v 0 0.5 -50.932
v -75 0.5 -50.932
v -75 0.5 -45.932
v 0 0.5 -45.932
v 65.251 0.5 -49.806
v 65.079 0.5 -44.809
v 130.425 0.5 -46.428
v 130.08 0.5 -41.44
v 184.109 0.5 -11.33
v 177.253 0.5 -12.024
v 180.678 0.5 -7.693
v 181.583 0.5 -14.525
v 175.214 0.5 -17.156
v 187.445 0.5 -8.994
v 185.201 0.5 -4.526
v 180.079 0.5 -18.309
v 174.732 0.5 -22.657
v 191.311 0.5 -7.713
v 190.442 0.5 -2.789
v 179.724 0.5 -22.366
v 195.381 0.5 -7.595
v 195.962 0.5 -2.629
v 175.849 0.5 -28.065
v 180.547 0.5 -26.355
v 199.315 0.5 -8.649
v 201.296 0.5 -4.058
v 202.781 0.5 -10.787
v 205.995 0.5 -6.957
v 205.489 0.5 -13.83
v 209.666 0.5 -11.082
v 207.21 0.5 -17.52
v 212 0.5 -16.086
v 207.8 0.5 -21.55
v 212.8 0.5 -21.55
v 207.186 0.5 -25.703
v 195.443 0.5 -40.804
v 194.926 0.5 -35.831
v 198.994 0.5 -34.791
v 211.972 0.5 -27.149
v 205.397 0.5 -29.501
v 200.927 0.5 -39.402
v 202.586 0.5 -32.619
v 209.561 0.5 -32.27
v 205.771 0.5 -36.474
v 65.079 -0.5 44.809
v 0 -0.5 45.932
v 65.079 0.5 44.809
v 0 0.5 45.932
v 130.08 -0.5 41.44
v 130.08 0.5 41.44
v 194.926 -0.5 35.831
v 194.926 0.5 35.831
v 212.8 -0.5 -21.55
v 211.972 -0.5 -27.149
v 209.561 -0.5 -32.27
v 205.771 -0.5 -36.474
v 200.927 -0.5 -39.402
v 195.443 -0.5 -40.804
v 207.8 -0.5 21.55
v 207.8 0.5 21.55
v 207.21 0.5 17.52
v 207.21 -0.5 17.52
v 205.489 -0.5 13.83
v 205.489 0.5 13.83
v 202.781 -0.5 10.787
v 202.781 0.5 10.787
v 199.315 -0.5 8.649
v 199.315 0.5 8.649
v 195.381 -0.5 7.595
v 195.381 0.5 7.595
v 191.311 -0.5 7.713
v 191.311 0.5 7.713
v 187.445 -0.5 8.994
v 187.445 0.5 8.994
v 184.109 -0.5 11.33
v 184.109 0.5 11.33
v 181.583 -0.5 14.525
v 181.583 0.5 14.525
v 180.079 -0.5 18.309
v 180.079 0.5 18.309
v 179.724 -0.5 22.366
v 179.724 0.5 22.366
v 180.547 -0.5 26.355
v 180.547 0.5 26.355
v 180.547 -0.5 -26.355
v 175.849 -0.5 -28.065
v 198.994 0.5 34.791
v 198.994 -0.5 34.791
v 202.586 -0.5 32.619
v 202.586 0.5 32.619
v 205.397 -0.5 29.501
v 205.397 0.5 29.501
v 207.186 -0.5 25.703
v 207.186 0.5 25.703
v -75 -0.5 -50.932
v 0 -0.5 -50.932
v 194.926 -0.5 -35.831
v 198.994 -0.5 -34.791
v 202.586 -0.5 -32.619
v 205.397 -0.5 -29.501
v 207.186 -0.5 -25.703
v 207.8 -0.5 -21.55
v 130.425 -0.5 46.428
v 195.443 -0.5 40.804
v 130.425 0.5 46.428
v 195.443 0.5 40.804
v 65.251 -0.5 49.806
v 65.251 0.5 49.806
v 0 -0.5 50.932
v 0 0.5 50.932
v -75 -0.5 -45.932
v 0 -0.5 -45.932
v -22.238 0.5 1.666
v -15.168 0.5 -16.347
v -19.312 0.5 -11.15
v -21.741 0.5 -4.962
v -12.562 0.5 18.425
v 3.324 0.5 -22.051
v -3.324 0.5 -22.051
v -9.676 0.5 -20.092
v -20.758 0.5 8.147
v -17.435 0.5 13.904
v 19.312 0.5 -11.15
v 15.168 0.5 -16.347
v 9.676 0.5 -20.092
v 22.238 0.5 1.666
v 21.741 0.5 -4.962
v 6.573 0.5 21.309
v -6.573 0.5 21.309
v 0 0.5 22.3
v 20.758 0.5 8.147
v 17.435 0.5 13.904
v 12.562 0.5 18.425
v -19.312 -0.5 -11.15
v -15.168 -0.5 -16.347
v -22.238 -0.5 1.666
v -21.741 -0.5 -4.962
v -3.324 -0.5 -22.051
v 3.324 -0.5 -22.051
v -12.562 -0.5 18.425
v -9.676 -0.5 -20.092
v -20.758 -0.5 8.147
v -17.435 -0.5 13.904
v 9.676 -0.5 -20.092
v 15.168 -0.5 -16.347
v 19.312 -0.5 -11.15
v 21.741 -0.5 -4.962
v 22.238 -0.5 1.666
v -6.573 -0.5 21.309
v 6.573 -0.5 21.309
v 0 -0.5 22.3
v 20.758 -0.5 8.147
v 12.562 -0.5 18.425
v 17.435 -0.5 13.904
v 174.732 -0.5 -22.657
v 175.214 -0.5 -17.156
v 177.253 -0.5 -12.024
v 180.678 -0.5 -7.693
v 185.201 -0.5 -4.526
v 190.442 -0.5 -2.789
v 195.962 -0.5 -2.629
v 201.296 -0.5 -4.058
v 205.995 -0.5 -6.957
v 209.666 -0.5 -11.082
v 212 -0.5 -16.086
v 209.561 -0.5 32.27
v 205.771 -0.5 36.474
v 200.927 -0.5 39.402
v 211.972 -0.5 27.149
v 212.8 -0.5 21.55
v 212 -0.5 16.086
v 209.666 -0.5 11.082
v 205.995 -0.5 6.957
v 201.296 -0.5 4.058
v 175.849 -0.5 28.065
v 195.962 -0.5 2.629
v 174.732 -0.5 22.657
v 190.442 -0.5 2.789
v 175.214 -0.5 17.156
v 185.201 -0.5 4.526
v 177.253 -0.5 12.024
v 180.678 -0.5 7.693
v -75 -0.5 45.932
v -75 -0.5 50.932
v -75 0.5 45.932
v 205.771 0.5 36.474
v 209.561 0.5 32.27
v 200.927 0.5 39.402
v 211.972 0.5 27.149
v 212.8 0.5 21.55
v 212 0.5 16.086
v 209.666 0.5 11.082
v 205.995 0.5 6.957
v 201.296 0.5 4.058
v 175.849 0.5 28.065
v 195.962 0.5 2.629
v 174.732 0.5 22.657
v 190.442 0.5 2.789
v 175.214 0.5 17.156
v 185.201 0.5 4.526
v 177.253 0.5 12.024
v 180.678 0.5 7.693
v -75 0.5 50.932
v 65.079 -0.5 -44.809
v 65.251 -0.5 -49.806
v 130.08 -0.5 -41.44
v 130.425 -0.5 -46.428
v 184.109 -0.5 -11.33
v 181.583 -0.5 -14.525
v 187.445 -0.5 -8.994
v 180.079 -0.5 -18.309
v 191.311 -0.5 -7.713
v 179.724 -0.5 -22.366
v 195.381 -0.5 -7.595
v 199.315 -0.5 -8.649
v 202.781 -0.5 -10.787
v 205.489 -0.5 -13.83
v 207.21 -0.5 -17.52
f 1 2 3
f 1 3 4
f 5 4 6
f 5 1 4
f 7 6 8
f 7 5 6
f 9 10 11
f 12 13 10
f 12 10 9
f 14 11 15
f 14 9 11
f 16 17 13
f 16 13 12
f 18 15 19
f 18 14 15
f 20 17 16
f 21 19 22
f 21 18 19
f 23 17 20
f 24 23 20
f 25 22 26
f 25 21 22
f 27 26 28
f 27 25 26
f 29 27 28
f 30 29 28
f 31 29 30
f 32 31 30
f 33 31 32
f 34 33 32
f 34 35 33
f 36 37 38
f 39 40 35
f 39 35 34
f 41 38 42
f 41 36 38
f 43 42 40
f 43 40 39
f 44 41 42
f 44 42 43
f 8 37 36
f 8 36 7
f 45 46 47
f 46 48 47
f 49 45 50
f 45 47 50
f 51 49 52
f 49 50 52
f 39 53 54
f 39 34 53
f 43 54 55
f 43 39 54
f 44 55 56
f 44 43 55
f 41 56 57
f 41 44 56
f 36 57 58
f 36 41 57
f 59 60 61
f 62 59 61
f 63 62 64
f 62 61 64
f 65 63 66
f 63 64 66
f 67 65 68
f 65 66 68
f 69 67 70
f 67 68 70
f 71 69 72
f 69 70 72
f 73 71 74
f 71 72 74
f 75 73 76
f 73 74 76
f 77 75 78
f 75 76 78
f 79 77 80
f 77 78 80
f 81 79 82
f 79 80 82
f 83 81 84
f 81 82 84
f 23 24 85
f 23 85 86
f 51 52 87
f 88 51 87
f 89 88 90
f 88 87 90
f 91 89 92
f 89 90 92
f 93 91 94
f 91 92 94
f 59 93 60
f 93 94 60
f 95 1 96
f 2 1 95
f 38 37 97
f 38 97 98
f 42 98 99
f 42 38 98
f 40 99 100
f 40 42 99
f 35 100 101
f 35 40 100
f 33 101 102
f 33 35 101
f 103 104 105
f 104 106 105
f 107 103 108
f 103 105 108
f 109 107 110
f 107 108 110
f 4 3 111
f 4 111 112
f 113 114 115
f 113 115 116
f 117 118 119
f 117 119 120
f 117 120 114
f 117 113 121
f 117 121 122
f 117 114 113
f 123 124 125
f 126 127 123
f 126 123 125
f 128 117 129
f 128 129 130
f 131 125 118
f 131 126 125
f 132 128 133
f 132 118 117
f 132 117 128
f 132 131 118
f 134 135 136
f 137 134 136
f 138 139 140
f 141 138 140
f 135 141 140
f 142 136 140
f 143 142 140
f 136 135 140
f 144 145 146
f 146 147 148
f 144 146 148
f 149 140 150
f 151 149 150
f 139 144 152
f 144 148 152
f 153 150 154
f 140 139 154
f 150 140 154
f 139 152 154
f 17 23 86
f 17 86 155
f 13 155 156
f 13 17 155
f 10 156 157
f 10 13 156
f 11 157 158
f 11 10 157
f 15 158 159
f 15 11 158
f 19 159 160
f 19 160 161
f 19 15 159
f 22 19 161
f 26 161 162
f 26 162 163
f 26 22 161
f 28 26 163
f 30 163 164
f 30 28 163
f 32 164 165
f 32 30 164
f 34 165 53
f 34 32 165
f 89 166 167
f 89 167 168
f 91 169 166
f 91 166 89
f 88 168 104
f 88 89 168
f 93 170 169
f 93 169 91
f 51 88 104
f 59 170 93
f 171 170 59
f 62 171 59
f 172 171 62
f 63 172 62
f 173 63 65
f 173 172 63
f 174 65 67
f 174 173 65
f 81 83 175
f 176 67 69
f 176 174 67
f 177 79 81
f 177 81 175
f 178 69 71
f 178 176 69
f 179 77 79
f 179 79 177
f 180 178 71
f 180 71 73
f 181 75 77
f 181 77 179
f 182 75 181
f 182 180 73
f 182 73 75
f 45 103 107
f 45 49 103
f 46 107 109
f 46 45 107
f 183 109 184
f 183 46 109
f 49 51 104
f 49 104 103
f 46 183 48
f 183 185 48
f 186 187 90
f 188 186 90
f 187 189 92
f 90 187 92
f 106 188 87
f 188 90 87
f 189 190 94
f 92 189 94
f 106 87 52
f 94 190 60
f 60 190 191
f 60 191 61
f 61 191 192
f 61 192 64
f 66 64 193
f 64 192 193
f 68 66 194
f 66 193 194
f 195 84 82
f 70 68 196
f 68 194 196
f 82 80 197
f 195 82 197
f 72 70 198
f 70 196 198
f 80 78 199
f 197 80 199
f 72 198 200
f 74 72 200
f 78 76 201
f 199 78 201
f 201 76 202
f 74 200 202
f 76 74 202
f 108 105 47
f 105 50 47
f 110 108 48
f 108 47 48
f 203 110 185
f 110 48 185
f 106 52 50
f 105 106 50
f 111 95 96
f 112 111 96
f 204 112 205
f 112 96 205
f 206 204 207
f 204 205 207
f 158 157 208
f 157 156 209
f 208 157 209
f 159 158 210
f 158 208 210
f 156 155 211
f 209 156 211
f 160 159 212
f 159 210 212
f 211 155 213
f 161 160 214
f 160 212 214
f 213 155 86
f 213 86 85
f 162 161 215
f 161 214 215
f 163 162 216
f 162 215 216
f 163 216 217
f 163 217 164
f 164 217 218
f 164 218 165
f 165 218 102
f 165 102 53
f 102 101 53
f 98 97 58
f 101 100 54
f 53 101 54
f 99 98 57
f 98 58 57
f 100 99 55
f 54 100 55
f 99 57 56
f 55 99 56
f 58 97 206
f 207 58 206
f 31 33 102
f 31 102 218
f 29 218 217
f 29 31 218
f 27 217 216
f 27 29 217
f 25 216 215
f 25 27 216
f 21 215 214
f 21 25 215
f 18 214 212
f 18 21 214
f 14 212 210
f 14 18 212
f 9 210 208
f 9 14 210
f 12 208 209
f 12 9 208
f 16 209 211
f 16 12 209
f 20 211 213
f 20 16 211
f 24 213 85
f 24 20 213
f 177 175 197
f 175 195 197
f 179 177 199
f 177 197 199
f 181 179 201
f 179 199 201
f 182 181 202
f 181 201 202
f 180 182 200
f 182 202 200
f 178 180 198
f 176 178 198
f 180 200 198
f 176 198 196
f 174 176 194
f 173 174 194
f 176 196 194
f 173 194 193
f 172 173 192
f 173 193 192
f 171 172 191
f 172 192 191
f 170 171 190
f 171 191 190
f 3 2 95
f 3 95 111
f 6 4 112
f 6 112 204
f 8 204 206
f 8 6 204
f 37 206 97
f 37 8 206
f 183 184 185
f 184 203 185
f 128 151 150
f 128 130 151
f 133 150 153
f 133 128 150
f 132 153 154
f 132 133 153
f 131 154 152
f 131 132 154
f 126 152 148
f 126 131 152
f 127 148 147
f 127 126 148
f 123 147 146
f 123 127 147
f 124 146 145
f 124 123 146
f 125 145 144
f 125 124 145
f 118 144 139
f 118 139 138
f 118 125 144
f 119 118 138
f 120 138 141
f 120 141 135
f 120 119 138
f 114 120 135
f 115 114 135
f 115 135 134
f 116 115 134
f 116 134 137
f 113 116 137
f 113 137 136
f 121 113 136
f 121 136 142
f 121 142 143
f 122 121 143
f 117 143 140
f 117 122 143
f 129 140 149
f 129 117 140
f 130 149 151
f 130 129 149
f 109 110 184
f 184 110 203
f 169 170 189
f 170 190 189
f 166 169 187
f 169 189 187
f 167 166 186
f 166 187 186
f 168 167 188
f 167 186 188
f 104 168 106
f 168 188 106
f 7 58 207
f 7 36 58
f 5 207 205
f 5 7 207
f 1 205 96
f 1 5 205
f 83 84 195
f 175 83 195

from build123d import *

# Parameters (mm, degrees)
SKETCH1_R             = 22.3
BOSS_EXTRUDE1_DEPTH   = 0.5
BOSS_EXTRUDE1_2_DEPTH = 0.5
BOSS_EXTRUDE1_3_DEPTH = 0.5


with BuildPart() as part:
    # Sketch1 → Boss-Extrude1 (new, symmetric)
    with BuildSketch(Plane(origin=(0, 0, 0), x_dir=(1, 0, 0), z_dir=(0, 1, 0))):
        with Locations(Location((0, 0, 0), (0, 0, 270))):
            Circle(SKETCH1_R)
    extrude(amount=BOSS_EXTRUDE1_DEPTH, both=True)


with BuildPart() as body_2:
    # Sketch1 → Boss-Extrude1 2 (new, symmetric)
    with BuildSketch(Plane(origin=(0, 0, 0), x_dir=(1, 0, 0), z_dir=(0, 1, 0))):
        with BuildLine():
            Line((0, 50.931890821), (-75, 50.931890821))
            Line((-75, 50.931890821), (-75, 45.931890821))
            Line((-75, 45.931890821), (0, 45.931890821))
            ThreePointArc((0, 45.931890821), (97.59386772, 43.404960787), (194.92619862, 35.830942477))
            ThreePointArc((194.92619862, 35.830942477), (204.106473558, 31.16353317), (207.8, 21.55))
            ThreePointArc((207.8, 21.55), (191.310601503, 7.71338788), (180.547069755, 26.354699048))
            Line((180.547069755, 26.354699048), (175.848518066, 28.06455636))
            ThreePointArc((175.848518066, 28.06455636), (190.442488159, 2.789326627), (212.8, 21.55))
            ThreePointArc((212.8, 21.55), (207.820233688, 34.511366155), (195.443004341, 40.804161942))
            ThreePointArc((195.443004341, 40.804161942), (97.852617285, 48.398261165), (0, 50.931890821))
        make_face()
    extrude(amount=BOSS_EXTRUDE1_2_DEPTH, both=True)


with BuildPart() as body_3:
    # Sketch1 → Boss-Extrude1 3 (new, symmetric)
    with BuildSketch(Plane(origin=(0, 0, 0), x_dir=(1, 0, 0), z_dir=(0, 1, 0))):
        with BuildLine():
            Line((180.547069755, -26.354699048), (175.848518066, -28.06455636))
            ThreePointArc((175.848518066, -28.06455636), (190.442488159, -2.789326627), (212.8, -21.55))
            ThreePointArc((212.8, -21.55), (207.820233688, -34.511366155), (195.443004341, -40.804161942))
            ThreePointArc((195.443004341, -40.804161942), (97.852617285, -48.398261165), (0, -50.931890821))
            Line((0, -50.931890821), (-75, -50.931890821))
            Line((-75, -50.931890821), (-75, -45.931890821))
            Line((-75, -45.931890821), (0, -45.931890821))
            ThreePointArc((0, -45.931890821), (97.59386772, -43.404960787), (194.92619862, -35.830942477))
            ThreePointArc((194.92619862, -35.830942477), (204.106473558, -31.16353317), (207.8, -21.55))
            ThreePointArc((207.8, -21.55), (191.310601503, -7.71338788), (180.547069755, -26.354699048))
        make_face()
    extrude(amount=BOSS_EXTRUDE1_3_DEPTH, both=True)


solid = Compound([part.part, body_2.part, body_3.part])
